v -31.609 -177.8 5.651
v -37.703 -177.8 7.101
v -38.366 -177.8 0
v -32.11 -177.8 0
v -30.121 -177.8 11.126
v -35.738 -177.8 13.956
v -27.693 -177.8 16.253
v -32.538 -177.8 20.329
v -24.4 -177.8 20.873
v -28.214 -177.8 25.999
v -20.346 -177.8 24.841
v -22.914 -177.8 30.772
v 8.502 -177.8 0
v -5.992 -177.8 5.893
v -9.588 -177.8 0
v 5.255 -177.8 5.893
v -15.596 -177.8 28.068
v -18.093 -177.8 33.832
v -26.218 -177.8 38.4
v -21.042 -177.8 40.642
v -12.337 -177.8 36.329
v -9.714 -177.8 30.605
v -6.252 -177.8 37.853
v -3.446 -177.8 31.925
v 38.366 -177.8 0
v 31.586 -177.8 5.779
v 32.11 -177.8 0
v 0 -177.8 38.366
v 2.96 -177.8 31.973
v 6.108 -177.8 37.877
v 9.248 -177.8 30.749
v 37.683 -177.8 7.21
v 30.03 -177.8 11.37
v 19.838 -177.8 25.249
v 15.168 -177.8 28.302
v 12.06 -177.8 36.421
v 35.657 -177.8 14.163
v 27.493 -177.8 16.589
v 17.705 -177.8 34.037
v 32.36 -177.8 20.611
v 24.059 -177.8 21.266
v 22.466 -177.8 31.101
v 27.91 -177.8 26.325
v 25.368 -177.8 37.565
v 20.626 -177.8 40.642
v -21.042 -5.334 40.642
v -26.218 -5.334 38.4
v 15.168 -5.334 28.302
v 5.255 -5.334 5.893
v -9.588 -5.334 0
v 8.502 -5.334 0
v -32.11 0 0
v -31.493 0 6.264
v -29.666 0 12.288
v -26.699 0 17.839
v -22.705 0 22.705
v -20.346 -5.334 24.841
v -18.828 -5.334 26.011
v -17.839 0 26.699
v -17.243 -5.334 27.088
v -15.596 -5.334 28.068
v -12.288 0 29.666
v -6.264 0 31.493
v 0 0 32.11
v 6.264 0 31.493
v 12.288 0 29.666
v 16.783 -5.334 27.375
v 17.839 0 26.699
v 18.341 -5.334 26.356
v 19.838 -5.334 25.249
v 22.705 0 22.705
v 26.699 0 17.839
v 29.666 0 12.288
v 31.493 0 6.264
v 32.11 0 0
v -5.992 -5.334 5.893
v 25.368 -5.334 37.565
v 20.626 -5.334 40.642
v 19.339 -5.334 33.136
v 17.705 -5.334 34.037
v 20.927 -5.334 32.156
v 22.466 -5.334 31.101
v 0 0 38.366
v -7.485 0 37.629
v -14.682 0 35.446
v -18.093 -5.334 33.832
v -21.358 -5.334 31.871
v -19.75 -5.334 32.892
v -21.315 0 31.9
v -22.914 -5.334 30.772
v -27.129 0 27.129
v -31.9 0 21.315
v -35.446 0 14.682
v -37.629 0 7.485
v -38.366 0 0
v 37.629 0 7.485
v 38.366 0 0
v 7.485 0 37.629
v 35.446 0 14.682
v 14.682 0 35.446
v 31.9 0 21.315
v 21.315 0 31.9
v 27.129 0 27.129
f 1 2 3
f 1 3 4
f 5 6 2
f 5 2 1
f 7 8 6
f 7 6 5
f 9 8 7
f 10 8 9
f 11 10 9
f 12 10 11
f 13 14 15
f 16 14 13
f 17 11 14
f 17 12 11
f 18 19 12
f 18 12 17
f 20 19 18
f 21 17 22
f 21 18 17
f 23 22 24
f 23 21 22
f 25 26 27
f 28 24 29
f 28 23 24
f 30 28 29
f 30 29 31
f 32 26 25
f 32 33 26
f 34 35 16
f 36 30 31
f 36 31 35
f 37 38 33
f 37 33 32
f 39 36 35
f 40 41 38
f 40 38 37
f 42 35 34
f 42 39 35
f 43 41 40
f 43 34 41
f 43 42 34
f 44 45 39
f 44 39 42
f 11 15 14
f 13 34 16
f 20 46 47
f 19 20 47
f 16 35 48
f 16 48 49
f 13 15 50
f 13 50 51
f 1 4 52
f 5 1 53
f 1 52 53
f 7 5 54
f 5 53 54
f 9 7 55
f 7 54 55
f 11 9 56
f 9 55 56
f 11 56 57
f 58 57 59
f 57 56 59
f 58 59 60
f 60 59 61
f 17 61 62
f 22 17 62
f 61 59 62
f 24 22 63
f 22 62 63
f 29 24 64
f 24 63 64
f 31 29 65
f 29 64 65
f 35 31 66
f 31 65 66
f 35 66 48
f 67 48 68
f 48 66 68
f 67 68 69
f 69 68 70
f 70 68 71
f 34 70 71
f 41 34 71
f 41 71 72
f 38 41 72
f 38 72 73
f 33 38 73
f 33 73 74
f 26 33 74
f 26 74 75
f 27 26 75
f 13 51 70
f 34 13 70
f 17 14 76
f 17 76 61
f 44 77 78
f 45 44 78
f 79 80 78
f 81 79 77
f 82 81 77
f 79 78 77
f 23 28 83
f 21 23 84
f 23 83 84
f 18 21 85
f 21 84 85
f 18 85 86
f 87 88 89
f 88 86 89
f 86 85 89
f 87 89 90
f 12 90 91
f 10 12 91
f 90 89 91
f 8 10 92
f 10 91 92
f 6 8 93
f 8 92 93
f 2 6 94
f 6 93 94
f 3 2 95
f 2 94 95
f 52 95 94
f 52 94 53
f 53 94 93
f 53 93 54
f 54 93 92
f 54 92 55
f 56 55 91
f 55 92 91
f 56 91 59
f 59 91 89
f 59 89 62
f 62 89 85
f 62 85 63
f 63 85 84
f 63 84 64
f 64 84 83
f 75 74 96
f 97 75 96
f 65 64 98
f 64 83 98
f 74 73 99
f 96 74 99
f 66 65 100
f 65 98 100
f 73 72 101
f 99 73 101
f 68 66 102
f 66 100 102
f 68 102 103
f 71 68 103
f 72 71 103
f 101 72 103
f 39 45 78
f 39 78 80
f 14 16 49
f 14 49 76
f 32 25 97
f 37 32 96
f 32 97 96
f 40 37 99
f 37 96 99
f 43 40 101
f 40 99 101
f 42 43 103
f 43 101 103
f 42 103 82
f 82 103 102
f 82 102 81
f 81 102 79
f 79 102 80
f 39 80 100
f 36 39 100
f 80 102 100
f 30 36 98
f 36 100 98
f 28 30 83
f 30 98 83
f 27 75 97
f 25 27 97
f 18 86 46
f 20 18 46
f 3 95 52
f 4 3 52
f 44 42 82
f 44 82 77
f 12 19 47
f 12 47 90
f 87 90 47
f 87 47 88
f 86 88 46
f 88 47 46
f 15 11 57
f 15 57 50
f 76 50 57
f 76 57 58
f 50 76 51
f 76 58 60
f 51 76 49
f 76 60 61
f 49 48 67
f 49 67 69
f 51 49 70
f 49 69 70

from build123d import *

# Parameters (mm, degrees)
F1_DEPTH = 177.8
F3_DEPTH = 172.466


# Not quite as in the source:
# - a feature names something its author has since deleted; it is built from what else it names


with BuildPart() as f1:
    # F0 (on Front) → F1 (new body)
    with BuildSketch(Plane.XZ):
        with BuildLine():
            ThreePointArc((-32.1100279689, 0), (-22.7052185209, 22.7052185209), (0, 32.1100279689))
            ThreePointArc((0, 32.1100279689), (22.7052185209, 22.7052185209), (32.1100279689, 0))
            Line((32.1100279689, 0), (38.3662581444, 0))
            ThreePointArc((38.3662581444, 0), (27.1290413026, 27.1290413026), (0, 38.3662581444))
            ThreePointArc((0, 38.3662581444), (-27.1290413026, 27.1290413026), (-38.3662581444, 0))
            Line((-38.3662581444, 0), (-32.1100279689, 0))
        make_face()
    extrude(amount=F1_DEPTH)

    # F2 (on face) → F3 (join)
    with BuildSketch(Plane.XZ.offset(177.8)):
        Polygon((-26.2182112783, 38.40040043), (-9.5876645925, 0), (0, 0), (8.5017651877, 0), (25.3681559116, 37.5649854541), (20.6263340544, 40.6422178311), (5.2554043941, 5.8927594628), (-5.9924047246, 5.8927594628), (-21.0417917943, 40.6422178311), align=None)
    extrude(amount=-F3_DEPTH)


solid = f1.part
